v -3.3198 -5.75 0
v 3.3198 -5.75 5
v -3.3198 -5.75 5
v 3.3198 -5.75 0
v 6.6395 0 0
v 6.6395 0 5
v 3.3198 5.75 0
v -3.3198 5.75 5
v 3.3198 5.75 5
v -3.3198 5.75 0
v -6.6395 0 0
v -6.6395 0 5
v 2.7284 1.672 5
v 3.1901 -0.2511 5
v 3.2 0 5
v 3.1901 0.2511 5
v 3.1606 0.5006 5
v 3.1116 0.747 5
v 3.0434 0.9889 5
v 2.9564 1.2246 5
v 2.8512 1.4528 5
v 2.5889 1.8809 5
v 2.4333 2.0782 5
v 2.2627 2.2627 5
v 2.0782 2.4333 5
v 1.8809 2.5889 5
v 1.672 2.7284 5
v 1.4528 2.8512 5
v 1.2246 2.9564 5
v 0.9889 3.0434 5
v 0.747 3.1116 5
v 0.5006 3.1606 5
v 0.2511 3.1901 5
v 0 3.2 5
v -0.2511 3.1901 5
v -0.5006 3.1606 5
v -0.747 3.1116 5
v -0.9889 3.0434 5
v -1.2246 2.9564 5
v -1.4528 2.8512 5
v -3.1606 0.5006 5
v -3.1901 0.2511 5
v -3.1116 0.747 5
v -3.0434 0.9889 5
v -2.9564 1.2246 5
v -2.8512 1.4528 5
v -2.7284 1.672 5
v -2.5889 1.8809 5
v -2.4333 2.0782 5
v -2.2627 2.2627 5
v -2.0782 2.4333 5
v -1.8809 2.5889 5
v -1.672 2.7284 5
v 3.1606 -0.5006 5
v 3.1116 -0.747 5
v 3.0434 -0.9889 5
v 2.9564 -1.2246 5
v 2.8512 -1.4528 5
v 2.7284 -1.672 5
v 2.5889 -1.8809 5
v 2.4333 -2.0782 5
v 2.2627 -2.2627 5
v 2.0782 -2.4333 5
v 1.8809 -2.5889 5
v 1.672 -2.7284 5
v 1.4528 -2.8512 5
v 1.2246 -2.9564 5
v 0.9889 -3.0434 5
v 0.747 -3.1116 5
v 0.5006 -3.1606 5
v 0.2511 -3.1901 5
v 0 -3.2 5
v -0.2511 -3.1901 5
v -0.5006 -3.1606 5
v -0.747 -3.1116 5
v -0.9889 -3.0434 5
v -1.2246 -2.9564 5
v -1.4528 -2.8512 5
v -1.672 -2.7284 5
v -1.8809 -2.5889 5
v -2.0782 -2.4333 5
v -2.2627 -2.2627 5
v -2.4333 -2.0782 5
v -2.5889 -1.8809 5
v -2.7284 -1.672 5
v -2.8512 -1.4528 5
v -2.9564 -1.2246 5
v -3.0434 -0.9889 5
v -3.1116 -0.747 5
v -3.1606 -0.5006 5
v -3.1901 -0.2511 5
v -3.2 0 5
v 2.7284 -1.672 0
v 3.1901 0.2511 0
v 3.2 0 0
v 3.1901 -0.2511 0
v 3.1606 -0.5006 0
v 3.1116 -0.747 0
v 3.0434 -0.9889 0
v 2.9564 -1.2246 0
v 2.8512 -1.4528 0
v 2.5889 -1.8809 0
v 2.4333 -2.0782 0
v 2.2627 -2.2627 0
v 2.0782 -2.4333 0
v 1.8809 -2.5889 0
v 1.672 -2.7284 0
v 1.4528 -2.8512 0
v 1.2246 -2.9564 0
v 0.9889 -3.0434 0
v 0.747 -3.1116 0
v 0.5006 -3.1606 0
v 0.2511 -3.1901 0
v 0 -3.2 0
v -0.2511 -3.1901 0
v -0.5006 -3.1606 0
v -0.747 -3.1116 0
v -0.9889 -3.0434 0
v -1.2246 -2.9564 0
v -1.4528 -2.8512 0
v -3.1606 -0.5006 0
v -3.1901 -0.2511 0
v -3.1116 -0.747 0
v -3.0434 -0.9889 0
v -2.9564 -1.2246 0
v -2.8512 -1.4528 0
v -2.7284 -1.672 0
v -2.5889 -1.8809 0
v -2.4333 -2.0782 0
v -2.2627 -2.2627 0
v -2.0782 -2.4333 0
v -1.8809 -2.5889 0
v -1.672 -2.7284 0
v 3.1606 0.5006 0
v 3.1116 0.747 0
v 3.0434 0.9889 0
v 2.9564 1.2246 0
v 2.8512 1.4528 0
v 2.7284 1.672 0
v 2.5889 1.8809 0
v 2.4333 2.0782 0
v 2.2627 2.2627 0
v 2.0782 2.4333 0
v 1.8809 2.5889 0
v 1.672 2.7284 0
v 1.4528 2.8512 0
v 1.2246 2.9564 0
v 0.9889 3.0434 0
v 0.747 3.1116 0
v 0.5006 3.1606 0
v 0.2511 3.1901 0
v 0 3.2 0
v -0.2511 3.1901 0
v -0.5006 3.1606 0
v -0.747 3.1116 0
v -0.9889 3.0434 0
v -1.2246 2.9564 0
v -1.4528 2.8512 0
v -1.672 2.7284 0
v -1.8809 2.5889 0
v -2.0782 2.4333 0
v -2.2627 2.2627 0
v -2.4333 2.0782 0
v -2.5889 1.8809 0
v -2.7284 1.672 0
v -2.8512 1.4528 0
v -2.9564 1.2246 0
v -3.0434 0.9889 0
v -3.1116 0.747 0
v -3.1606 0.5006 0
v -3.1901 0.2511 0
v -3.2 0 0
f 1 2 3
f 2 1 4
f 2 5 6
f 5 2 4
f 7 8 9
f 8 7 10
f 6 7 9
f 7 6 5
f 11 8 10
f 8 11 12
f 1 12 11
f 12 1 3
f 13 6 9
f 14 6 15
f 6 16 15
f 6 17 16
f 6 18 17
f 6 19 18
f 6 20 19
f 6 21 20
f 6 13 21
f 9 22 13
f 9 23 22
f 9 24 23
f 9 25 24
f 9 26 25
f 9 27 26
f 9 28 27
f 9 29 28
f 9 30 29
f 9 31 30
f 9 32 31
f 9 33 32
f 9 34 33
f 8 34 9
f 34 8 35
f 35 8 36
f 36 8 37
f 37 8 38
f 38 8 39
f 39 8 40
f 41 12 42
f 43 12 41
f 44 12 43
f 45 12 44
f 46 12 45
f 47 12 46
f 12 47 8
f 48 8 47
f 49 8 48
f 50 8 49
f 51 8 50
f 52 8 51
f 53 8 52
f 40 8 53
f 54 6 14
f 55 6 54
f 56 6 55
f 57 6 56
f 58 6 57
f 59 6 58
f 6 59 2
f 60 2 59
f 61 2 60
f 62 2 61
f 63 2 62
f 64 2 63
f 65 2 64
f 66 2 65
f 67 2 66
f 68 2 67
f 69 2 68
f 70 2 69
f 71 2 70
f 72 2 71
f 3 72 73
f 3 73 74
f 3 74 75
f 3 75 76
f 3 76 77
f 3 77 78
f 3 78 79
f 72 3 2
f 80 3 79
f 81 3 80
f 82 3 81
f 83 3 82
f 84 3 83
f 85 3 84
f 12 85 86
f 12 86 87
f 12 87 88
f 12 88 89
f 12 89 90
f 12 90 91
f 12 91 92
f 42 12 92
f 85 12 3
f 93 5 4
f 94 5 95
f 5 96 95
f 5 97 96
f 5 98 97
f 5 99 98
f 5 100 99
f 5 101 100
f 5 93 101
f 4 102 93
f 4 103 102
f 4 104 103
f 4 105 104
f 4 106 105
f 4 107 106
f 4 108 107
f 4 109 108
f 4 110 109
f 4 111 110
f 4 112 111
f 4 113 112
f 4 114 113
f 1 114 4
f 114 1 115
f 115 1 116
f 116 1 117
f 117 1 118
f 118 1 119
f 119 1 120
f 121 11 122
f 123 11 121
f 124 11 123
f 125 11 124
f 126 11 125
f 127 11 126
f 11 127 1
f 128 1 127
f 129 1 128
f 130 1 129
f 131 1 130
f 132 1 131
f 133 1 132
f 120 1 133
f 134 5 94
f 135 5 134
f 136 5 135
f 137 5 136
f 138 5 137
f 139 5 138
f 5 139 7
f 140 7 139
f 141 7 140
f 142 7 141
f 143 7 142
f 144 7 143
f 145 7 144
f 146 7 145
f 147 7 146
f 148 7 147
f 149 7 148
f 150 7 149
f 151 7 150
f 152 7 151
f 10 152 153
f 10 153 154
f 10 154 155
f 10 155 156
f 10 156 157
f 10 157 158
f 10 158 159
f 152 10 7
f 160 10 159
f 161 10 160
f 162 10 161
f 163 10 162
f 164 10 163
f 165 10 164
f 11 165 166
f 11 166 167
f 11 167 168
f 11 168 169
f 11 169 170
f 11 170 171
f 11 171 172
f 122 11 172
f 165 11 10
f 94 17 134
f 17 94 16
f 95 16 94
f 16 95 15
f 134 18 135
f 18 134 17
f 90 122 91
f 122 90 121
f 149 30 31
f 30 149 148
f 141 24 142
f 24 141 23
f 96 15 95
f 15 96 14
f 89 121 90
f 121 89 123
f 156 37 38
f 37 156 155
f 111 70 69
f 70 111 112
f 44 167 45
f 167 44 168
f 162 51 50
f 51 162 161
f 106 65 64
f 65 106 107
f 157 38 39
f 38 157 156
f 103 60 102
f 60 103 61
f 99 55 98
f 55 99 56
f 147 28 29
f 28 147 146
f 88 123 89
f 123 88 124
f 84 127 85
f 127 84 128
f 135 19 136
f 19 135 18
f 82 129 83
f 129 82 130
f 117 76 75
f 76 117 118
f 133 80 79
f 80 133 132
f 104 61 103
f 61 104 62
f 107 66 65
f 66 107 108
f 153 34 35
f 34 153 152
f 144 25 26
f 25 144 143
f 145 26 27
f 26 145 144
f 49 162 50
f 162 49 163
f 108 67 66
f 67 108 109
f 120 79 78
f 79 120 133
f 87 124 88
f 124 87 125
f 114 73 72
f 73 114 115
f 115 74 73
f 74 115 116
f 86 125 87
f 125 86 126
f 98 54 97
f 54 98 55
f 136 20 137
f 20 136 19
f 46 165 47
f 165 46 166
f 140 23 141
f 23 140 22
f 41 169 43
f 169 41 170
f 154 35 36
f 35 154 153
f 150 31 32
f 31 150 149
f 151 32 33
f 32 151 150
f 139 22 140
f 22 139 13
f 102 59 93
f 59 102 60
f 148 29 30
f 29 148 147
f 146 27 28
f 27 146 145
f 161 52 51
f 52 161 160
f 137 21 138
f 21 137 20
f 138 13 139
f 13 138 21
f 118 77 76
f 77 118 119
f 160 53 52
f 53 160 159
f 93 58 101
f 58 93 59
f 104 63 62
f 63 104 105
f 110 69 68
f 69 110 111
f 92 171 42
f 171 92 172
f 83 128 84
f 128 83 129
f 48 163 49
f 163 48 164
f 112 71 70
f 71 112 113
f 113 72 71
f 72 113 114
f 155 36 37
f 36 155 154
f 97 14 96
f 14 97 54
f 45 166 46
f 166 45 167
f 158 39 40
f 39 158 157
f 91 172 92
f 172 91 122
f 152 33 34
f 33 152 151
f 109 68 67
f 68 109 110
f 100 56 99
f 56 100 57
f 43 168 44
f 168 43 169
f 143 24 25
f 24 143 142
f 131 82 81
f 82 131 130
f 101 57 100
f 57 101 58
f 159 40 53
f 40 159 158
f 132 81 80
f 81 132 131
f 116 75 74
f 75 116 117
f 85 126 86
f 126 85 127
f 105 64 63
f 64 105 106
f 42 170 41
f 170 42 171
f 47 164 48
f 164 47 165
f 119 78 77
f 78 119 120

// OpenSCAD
$fn = 120;

across_flats = 11.5;   // mm
thickness    = 5.0;    // mm
screw_diam   = 6.0;    // mm (clearance hole)

clearance = 0.4;       // mm added to screw diameter for clearance
hole_diam = screw_diam + clearance;

flat_to_vertex = across_flats / cos(30); // circumradius for hex with given across-flats

difference() {
    cylinder(h = thickness, r = flat_to_vertex/2, $fn = 6);
    translate([0,0,-0.1])
        cylinder(h = thickness + 0.2, d = hole_diam, $fn = 80);
}
